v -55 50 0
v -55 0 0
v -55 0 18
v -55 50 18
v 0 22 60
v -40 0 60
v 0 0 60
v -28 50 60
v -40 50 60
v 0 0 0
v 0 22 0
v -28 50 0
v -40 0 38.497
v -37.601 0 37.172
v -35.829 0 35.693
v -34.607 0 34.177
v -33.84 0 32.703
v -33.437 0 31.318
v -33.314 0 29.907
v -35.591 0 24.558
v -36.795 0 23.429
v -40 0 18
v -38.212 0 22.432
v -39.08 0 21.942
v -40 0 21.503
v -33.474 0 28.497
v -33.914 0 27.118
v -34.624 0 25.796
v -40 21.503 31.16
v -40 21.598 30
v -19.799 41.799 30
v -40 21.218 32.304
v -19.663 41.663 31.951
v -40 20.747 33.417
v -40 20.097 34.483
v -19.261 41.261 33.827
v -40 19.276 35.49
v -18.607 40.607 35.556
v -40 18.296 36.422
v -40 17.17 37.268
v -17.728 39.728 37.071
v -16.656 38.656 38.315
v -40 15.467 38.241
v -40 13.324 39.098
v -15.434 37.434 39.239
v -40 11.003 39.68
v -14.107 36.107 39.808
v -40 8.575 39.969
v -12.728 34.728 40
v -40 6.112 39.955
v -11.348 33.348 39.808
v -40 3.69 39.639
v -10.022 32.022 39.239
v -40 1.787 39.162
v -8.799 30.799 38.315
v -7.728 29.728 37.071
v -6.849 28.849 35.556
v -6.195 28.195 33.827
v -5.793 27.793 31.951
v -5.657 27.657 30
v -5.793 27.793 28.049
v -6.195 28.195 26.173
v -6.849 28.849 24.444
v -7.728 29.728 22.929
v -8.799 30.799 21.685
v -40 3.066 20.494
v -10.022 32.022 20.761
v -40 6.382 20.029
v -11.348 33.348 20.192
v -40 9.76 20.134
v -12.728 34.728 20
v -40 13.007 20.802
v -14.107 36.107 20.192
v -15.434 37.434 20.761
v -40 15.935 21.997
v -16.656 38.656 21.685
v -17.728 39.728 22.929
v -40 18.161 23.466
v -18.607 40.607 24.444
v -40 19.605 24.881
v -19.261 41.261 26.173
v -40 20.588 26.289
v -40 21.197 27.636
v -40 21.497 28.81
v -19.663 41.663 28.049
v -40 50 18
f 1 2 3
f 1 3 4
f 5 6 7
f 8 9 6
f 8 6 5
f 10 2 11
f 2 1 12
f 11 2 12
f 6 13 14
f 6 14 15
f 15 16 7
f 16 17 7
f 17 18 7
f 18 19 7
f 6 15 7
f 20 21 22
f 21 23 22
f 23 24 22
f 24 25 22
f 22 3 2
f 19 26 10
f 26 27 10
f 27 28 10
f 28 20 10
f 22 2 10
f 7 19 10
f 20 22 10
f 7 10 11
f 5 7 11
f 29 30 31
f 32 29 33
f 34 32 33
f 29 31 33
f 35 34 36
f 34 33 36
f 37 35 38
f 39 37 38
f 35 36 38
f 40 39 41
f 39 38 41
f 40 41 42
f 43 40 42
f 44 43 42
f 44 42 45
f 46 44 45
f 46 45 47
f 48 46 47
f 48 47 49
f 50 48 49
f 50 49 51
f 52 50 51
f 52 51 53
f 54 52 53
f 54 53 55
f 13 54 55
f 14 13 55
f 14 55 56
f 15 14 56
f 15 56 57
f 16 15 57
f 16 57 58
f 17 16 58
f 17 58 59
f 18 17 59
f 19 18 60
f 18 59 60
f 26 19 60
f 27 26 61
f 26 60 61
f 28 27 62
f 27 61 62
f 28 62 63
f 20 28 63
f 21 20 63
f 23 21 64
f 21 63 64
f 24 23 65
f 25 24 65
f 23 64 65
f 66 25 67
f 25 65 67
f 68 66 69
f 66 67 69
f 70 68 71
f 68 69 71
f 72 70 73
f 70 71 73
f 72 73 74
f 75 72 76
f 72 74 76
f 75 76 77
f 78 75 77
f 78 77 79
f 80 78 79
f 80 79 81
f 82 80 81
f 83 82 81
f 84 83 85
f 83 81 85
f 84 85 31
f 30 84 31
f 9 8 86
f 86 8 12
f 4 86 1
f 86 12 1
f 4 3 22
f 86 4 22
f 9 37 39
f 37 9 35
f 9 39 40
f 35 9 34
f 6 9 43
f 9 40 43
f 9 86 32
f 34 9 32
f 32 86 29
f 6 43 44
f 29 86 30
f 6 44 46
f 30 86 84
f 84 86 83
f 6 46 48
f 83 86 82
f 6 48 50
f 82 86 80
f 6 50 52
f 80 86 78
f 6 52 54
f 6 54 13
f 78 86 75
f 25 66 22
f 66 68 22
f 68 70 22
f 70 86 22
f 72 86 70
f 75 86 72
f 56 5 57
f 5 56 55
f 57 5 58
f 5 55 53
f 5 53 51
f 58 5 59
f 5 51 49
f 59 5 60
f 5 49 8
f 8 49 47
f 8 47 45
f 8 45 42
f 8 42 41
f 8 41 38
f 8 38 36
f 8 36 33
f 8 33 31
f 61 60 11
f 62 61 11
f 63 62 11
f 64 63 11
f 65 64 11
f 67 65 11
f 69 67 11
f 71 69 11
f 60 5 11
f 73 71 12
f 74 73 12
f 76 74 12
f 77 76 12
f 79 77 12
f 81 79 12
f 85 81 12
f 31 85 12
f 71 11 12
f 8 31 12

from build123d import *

# Parameters (mm, degrees)
SKETCH1_W           = 15
SKETCH1_H           = 50
BOSS_EXTRUDE1_DEPTH = 18
BOSS_EXTRUDE2_DEPTH = 60
SKETCH2_R           = 10
CUT_EXTRUDE2_DEPTH  = 60


with BuildPart() as part:
    # Sketch1 → Boss-Extrude1 (new body)
    with BuildSketch(Plane.XY):
        with Locations((-47.5, 25)):
            Rectangle(SKETCH1_W, SKETCH1_H)
    extrude(amount=BOSS_EXTRUDE1_DEPTH)

    # Sketch1<3> → Boss-Extrude2 (add)
    with BuildSketch(Plane.XY):
        Polygon((-28, 50), (-40, 50), (-40, 0), (0, 0), (0, 22), align=None)
    extrude(amount=BOSS_EXTRUDE2_DEPTH)

    # Sketch2 → Cut-Extrude2 (cut)
    with BuildSketch(Plane(origin=(11, 11, 0), x_dir=(0, 0, -1), z_dir=(0.7071067811865464, 0.7071067811865488, 0))):
        with Locations((-30, 33.556349186)):
            Circle(SKETCH2_R)
    extrude(amount=-CUT_EXTRUDE2_DEPTH, mode=Mode.SUBTRACT)


solid = part.part
